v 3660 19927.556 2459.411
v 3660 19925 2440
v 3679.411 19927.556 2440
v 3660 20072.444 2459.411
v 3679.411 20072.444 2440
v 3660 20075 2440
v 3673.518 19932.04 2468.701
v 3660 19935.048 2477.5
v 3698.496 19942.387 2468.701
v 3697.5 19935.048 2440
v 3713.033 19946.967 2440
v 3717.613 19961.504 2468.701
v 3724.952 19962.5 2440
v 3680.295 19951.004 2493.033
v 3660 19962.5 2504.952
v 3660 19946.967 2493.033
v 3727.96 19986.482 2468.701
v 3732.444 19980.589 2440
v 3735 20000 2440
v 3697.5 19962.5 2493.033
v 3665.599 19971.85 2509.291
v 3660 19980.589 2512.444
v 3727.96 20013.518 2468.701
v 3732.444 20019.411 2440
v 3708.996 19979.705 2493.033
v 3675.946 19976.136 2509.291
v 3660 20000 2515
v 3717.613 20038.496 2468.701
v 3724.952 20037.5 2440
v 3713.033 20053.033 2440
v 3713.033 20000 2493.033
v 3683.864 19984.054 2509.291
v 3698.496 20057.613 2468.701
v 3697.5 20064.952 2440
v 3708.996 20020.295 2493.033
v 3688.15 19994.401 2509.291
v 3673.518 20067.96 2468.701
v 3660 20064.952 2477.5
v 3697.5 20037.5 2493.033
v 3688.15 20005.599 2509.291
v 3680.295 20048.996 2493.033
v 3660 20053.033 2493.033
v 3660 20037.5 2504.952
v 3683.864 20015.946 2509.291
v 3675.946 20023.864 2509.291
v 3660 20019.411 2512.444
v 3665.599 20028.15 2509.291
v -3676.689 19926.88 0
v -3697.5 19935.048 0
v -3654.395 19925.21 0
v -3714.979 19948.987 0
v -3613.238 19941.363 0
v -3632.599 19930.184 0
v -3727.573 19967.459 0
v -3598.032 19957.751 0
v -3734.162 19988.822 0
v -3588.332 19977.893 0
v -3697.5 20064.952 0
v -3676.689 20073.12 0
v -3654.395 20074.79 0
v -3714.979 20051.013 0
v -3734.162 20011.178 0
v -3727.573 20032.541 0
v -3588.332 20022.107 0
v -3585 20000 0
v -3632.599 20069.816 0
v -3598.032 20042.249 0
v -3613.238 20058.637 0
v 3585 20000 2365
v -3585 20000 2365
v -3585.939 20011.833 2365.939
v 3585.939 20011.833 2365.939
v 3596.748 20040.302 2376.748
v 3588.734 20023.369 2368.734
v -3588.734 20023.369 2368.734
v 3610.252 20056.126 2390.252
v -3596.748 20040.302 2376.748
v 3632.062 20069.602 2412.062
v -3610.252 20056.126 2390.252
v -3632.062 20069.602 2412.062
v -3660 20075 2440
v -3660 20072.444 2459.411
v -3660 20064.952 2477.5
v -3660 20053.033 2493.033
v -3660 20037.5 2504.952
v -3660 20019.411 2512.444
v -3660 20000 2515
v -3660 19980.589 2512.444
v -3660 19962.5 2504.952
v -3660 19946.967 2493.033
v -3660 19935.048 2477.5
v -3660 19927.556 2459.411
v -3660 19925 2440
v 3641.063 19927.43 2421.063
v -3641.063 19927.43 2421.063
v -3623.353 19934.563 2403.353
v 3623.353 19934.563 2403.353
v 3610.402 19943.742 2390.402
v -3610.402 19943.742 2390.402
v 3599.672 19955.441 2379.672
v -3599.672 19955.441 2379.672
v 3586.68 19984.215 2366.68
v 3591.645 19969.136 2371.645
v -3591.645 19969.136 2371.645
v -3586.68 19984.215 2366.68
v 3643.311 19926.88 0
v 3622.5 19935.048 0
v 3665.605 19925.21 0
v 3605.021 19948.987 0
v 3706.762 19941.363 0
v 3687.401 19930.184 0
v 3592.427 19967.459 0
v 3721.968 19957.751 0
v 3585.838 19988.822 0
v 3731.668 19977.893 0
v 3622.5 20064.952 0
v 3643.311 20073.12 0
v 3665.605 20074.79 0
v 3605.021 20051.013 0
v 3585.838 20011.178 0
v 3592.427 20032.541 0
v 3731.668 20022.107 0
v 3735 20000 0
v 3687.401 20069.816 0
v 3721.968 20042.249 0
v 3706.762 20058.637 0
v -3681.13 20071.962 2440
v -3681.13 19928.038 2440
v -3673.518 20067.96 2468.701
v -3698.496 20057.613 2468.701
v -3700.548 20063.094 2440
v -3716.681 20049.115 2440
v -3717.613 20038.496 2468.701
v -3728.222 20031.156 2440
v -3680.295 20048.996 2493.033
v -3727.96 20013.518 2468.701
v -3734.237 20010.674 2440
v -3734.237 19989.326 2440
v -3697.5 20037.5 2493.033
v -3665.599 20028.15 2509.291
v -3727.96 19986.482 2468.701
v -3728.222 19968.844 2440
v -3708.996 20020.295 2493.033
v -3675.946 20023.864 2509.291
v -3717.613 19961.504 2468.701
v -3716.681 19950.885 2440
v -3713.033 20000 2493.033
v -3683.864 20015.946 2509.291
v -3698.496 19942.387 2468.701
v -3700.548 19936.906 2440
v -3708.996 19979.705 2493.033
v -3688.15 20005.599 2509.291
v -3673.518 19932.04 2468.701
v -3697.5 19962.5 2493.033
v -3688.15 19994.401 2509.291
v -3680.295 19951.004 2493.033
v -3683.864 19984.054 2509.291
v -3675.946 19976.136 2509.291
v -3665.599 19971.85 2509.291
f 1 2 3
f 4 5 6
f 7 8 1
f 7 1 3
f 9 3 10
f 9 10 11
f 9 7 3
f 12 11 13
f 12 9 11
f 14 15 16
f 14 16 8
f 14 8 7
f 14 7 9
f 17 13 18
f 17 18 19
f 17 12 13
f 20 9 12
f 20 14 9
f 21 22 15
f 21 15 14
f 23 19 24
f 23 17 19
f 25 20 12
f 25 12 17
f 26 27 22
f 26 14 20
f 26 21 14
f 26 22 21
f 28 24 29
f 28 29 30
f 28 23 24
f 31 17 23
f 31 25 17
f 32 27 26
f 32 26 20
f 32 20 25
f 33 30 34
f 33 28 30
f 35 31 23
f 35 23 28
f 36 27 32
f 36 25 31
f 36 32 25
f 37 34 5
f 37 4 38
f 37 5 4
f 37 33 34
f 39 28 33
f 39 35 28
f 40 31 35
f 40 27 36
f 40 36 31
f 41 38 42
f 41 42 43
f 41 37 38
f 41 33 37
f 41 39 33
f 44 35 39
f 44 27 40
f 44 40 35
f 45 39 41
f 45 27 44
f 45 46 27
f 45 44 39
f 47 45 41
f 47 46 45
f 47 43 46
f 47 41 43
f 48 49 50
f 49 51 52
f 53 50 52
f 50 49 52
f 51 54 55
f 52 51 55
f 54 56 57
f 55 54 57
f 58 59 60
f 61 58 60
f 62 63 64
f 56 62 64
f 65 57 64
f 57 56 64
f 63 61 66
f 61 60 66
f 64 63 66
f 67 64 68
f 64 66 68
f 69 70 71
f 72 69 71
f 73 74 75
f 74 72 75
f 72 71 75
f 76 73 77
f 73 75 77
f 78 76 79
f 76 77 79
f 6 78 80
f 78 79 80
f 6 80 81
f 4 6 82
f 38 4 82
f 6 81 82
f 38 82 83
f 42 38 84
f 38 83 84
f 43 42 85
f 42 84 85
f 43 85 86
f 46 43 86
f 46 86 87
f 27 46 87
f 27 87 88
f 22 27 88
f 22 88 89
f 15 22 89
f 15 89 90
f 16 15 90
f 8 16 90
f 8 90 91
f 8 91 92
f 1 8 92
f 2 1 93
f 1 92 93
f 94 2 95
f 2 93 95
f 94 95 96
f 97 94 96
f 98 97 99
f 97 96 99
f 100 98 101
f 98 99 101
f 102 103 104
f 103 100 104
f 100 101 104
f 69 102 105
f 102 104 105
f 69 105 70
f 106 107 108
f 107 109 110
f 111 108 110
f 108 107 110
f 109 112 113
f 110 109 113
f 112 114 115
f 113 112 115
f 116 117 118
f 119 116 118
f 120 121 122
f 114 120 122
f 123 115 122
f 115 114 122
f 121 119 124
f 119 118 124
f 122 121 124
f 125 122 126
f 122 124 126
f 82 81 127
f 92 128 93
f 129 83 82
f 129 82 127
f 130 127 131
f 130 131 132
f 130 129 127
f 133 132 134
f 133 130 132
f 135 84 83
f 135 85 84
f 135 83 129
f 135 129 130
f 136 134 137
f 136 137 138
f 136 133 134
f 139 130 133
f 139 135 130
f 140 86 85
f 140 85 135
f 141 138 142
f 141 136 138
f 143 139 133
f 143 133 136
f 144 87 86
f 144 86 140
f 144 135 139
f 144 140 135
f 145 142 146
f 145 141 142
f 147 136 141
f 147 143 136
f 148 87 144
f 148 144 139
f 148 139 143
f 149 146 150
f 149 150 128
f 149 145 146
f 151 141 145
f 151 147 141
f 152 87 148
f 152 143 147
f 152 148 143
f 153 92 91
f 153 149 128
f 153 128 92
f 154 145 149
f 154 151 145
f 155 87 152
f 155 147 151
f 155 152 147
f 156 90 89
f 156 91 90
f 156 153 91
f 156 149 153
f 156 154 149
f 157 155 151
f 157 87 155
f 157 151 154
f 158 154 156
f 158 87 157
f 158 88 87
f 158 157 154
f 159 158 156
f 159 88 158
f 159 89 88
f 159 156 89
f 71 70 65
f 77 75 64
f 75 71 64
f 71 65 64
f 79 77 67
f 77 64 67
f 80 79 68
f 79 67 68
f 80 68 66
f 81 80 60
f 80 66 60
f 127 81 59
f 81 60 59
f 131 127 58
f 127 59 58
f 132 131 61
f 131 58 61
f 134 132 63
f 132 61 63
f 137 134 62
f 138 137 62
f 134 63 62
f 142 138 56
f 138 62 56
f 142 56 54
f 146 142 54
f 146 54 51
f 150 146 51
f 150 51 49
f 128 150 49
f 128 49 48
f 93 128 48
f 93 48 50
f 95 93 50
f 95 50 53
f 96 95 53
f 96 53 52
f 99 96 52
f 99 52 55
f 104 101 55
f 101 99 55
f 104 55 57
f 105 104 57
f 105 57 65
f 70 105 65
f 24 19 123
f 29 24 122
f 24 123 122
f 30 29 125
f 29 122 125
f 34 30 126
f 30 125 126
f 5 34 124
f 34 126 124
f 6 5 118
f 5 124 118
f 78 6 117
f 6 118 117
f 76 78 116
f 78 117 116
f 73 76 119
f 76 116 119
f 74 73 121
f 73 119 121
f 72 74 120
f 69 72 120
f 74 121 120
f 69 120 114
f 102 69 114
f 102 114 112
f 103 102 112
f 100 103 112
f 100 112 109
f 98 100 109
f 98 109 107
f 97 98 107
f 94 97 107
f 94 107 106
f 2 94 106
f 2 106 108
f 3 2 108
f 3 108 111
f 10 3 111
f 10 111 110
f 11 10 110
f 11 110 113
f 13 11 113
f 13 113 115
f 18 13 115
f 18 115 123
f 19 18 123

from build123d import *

# Parameters (mm, degrees)
CYLINDER002_R     = 75
CYLINDER002_DEPTH = 7320
CYLINDER001_R     = 75
CYLINDER001_DEPTH = 2440
CYLINDER_R        = 75
CYLINDER_DEPTH    = 2440


with BuildPart() as sphere001:
    # Sphere001 → Sphere001 (revolve)
    with BuildSketch(Plane(origin=(3660, 0, 2440), x_dir=(1, 0, 0), z_dir=(0, -1, 0))):
        with BuildLine():
            ThreePointArc((0, -75), (75, 0), (0, 75))
            Line((0, 75), (0, -75))
        make_face()
    revolve(axis=Axis((3660, 0, 2440), (0, 0, 1)))


with BuildPart() as cylinder002:
    # Cylinder002 → Cylinder002 (new body)
    with BuildSketch(Plane(origin=(-3660, 0, 2440), x_dir=(0, 0, -1), z_dir=(1, 0, 0))):
        Circle(CYLINDER002_R)
    extrude(amount=CYLINDER002_DEPTH)


with BuildPart() as cylinder001:
    # Cylinder001 → Cylinder001 (new body)
    with BuildSketch(Plane(origin=(3660, 0, 0), x_dir=(1, 0, 0), z_dir=(0, 0, 1))):
        Circle(CYLINDER001_R)
    extrude(amount=CYLINDER001_DEPTH)


with BuildPart() as cylinder:
    # Cylinder → Cylinder (new body)
    with BuildSketch(Plane(origin=(-3660, 0, 0), x_dir=(1, 0, 0), z_dir=(0, 0, 1))):
        Circle(CYLINDER_R)
    extrude(amount=CYLINDER_DEPTH)


with BuildPart() as fusion:
    # Sphere002 → Sphere002 (revolve)
    with BuildSketch(Plane(origin=(-3660, 0, 2440), x_dir=(1, 0, 0), z_dir=(0, -1, 0))):
        with BuildLine():
            ThreePointArc((0, -75), (75, 0), (0, 75))
            Line((0, 75), (0, -75))
        make_face()
    revolve(axis=Axis((-3660, 0, 2440), (0, 0, 1)))

    # Fusion: union Sphere001, Cylinder002, Cylinder001, Cylinder
    add(sphere001.part)
    add(cylinder002.part)
    add(cylinder001.part)
    add(cylinder.part)


with BuildPart() as fusion_1:
    # Fusion placement: moved
    add(fusion.part.moved(Location((0, 20000, 0))))


solid = fusion_1.part
